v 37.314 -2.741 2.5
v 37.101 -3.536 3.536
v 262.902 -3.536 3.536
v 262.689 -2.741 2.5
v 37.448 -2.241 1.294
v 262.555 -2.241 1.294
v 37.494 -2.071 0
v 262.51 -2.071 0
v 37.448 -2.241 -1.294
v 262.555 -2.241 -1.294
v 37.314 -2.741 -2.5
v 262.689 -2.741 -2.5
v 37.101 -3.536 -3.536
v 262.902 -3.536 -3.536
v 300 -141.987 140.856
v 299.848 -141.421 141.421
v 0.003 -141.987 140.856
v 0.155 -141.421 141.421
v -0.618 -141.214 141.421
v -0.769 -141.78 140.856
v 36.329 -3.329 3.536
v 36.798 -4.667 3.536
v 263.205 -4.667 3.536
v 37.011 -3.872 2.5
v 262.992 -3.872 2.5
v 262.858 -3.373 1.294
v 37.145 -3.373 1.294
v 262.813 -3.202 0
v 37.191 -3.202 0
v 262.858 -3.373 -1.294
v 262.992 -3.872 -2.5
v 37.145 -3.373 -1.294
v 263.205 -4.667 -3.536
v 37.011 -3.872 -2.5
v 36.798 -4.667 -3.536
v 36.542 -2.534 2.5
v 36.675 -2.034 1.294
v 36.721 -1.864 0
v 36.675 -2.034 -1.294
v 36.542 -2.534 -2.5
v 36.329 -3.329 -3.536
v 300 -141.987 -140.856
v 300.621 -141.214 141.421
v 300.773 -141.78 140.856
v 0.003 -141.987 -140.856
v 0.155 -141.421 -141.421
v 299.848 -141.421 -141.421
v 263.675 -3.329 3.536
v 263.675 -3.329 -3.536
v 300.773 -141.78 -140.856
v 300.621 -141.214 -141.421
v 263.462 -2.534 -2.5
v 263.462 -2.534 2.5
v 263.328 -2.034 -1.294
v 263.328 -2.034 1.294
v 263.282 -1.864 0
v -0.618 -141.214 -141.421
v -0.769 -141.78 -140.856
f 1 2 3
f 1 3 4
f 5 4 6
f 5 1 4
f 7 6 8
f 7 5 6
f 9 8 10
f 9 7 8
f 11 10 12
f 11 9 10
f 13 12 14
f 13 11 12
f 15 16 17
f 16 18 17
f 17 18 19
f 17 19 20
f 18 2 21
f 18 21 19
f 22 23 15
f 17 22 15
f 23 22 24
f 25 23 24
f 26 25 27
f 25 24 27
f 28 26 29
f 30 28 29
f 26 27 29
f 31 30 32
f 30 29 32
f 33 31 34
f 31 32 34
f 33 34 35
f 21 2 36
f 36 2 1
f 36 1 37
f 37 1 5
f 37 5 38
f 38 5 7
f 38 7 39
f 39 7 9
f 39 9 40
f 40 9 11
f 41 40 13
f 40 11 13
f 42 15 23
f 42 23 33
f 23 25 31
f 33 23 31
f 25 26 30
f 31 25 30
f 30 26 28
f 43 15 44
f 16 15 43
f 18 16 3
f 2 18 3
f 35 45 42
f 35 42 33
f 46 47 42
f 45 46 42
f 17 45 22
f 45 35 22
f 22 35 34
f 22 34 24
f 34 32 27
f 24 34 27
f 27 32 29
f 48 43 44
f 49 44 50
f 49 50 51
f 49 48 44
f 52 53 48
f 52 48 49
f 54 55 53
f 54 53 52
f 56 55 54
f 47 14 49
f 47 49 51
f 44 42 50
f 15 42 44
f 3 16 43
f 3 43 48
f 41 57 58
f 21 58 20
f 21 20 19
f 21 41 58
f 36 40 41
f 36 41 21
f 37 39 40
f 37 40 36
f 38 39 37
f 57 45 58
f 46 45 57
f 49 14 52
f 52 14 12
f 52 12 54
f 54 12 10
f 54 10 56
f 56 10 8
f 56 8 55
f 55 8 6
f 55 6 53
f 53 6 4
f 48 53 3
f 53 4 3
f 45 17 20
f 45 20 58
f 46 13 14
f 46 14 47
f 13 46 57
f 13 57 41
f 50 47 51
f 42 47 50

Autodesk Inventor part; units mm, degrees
ref_plane "YZ Plane" through (0, 0, 0) normal (1, 0, 0) x (0, 1, 0)
ref_plane "XZ Plane" through (0, 0, 0) normal (0, 1, 0) x (-1, 0, 0)
ref_plane "XY Plane" through (0, 0, 0) normal (0, 0, 1) x (1, 0, 0)
sketch "Sketch1" plane through (0, 0, 0) normal (1, 0, 0) x (0, 1, 0)
  line L0 (-141.4214, 141.4214) -> (-3.5355, 3.5355)
  line L1 (-141.4214, 141.4214) -> (53.5786, 141.4214) construction
  line L2 (-3.5355, -3.5355) -> (-141.4214, -141.4214)
  line L3 (-141.987, -140.8557) -> (-4.6669, -3.5355)
  line L4 (-4.6669, 3.5355) -> (-141.987, 140.8557)
  line L5 (-141.4214, 141.4214) -> (-141.987, 140.8557)
  line L6 (-141.4214, -141.4214) -> (-141.987, -140.8557)
  arc A0 (-4.6669, -3.5355) -> (-4.6669, 3.5355) centre (-8.2024, 0) ccw
  arc A1 (-3.5355, -3.5355) -> (-3.5355, 3.5355) centre (-7.0711, 0) ccw
  point P0 (0, 0)
  point P1 (0, 0)
  point P2 (-1.1314, 0)
  dimension "d0" = 45
  dimension "d1" = 200
  dimension "d2" = 0.8
  dimension "d3" = 0.8
  dimension "d4" = 200
  dimension "d7" = 5
extrude "Extrusion1" add sketch "Sketch1" along normal blind 300
sketch "Sketch4" plane through (0, 0, 0) normal (0, 0, 1) x (1, 0, 0)
  line L0 (0, -141.4214) -> (0, -3.5355) projected
  line L1 (0, -141.4214) -> (300, -141.4214) projected
  line L2 (300, -3.5355) -> (300, -141.4214) projected
  line L3 (0, -3.5355) -> (300, -3.5355) projected
  line L4 (300, -4.6669) -> (300, -141.987) projected
  line L5 (300, -141.987) -> (261.9547, 0)
  line L6 (300, -141.987) -> (444.3601, -141.987) construction
  line L7 (0, -141.987) -> (145.1381, -141.987) construction
  line L8 (300, -2.5459) -> (300, -141.987)
  line L9 (261.9547, 0) -> (300, 0)
  line L10 (300, -3.5355) -> (300, -141.4214) projected
  line L11 (300, 0) -> (300, -3.5355)
  point P0 (0, 0)
  point P1 (262.6369, -2.5459)
  dimension "d10" = 105
extrude "Extrusion2" cut sketch "Sketch4" along normal through all both and the other way through all contours L5 L3 L2 L1 | L1 L4 L5 | L5 L9 L11 L8 L3
sketch "Sketch5" plane through (299.8484, -141.4214, -141.4214) normal (0.9659258, 0.258819, 0) x (-0.1798136, 0.6710737, -0.7192546)
  line L0 (-203.4359, 195.6898) -> (-203.4359, 196.504) projected
  line L1 (-5.8996, 202.5394) -> (-203.4359, 195.6898) projected
  ellipse E0 centre (-5.8996, 197.4504) end of major axis (-2.3034, 201.1736) minor radius 5 (-0.8137, 197.6268) -> (-5.8996, 202.5394) ccw projected
  line L2 (-0.8137, -0.0282) -> (-0.8137, 197.6268) projected
  line L3 (0, 0) -> (-0.8137, -0.0282) projected
  line L4 (0, 198.4692) -> (0, 0) projected
  ellipse E1 centre (-5.0859, 198.2929) end of major axis (-8.6822, 194.5697) minor radius 5 (0, 198.4692) -> (-5.0859, 203.3818) ccw projected
  line L5 (-203.4359, 196.504) -> (-5.0859, 203.3818) projected
  line L6 (-0.8137, -0.0282) -> (-203.4359, 195.6898)
  point P0 (47.103, 252.3228)
extrude "Extrusion3" add sketch "Sketch5" along normal blind 0.8
sketch "Sketch7" plane through (0, 0, 0) normal (0, 0, 1) x (1, 0, 0)
  line L0 (0, -142) -> (38.0488, 0)
  line L1 (0, -142) -> (147.0092, -142) construction
  line L2 (38.0488, 0) -> (0, 0)
  line L3 (0, -3.5355) -> (262.902, -3.5355) projected
  line L4 (0, 0) -> (0, -142)
  dimension "d18" = 75
extrude "Extrusion4" cut sketch "Sketch7" along normal through all both and the other way through all
sketch "Sketch8" plane through (0.155, -141.4214, 141.4214) normal (-0.9659258, 0.258819, 0) x (0.1798136, 0.6710737, 0.7192546)
  ellipse E0 centre (-5.8996, 197.4504) end of major axis (-2.3034, 201.1736) minor radius 5 (-0.8137, 197.6268) -> (-5.8996, 202.5394) ccw projected
  line L0 (-0.8137, -0.0282) -> (-0.8137, 197.6268) projected
  line L1 (0, 0) -> (-0.8137, -0.0282) projected
  line L2 (0, 198.4692) -> (0, 0) projected
  ellipse E1 centre (-5.0859, 198.2929) end of major axis (-8.6822, 194.5697) minor radius 5 (0, 198.4692) -> (-5.0859, 203.3818) ccw projected
  line L3 (-203.4359, 196.504) -> (-5.0859, 203.3818) projected
  line L4 (-203.4359, 195.6898) -> (-203.4359, 196.504) projected
  line L5 (-5.8996, 202.5394) -> (-203.4359, 195.6898) projected
  line L6 (-0.8137, -0.0282) -> (53.1297, 55.8182) projected
  line L7 (-5.8996, 202.5394) -> (-203.4359, 195.6898) projected
  line L8 (-0.8137, -0.0282) -> (-203.4359, 195.6898)
  point P0 (-6.8417, 196.4751)
extrude "Extrusion5" add sketch "Sketch8" along normal blind 0.8
equation "\"BendRadius\" = Thickness"
equation "\"BendReliefWidth\" = Thickness"
equation "\"BendReliefDepth\" = 0.5 * Thickness"
equation "\"CornerReliefSize\" = 4 * Thickness"
equation "\"MinimumRemnant\" = 2 * Thickness"
equation "\"TransitionRadius\" = BendRadius"
equation "\"JacobiRadiusSize\" = Thickness"
equation "\"GapSize\" = Thickness"
equation "\"Thickness\" = 0.5"
properties part number "chimneyRoof"
